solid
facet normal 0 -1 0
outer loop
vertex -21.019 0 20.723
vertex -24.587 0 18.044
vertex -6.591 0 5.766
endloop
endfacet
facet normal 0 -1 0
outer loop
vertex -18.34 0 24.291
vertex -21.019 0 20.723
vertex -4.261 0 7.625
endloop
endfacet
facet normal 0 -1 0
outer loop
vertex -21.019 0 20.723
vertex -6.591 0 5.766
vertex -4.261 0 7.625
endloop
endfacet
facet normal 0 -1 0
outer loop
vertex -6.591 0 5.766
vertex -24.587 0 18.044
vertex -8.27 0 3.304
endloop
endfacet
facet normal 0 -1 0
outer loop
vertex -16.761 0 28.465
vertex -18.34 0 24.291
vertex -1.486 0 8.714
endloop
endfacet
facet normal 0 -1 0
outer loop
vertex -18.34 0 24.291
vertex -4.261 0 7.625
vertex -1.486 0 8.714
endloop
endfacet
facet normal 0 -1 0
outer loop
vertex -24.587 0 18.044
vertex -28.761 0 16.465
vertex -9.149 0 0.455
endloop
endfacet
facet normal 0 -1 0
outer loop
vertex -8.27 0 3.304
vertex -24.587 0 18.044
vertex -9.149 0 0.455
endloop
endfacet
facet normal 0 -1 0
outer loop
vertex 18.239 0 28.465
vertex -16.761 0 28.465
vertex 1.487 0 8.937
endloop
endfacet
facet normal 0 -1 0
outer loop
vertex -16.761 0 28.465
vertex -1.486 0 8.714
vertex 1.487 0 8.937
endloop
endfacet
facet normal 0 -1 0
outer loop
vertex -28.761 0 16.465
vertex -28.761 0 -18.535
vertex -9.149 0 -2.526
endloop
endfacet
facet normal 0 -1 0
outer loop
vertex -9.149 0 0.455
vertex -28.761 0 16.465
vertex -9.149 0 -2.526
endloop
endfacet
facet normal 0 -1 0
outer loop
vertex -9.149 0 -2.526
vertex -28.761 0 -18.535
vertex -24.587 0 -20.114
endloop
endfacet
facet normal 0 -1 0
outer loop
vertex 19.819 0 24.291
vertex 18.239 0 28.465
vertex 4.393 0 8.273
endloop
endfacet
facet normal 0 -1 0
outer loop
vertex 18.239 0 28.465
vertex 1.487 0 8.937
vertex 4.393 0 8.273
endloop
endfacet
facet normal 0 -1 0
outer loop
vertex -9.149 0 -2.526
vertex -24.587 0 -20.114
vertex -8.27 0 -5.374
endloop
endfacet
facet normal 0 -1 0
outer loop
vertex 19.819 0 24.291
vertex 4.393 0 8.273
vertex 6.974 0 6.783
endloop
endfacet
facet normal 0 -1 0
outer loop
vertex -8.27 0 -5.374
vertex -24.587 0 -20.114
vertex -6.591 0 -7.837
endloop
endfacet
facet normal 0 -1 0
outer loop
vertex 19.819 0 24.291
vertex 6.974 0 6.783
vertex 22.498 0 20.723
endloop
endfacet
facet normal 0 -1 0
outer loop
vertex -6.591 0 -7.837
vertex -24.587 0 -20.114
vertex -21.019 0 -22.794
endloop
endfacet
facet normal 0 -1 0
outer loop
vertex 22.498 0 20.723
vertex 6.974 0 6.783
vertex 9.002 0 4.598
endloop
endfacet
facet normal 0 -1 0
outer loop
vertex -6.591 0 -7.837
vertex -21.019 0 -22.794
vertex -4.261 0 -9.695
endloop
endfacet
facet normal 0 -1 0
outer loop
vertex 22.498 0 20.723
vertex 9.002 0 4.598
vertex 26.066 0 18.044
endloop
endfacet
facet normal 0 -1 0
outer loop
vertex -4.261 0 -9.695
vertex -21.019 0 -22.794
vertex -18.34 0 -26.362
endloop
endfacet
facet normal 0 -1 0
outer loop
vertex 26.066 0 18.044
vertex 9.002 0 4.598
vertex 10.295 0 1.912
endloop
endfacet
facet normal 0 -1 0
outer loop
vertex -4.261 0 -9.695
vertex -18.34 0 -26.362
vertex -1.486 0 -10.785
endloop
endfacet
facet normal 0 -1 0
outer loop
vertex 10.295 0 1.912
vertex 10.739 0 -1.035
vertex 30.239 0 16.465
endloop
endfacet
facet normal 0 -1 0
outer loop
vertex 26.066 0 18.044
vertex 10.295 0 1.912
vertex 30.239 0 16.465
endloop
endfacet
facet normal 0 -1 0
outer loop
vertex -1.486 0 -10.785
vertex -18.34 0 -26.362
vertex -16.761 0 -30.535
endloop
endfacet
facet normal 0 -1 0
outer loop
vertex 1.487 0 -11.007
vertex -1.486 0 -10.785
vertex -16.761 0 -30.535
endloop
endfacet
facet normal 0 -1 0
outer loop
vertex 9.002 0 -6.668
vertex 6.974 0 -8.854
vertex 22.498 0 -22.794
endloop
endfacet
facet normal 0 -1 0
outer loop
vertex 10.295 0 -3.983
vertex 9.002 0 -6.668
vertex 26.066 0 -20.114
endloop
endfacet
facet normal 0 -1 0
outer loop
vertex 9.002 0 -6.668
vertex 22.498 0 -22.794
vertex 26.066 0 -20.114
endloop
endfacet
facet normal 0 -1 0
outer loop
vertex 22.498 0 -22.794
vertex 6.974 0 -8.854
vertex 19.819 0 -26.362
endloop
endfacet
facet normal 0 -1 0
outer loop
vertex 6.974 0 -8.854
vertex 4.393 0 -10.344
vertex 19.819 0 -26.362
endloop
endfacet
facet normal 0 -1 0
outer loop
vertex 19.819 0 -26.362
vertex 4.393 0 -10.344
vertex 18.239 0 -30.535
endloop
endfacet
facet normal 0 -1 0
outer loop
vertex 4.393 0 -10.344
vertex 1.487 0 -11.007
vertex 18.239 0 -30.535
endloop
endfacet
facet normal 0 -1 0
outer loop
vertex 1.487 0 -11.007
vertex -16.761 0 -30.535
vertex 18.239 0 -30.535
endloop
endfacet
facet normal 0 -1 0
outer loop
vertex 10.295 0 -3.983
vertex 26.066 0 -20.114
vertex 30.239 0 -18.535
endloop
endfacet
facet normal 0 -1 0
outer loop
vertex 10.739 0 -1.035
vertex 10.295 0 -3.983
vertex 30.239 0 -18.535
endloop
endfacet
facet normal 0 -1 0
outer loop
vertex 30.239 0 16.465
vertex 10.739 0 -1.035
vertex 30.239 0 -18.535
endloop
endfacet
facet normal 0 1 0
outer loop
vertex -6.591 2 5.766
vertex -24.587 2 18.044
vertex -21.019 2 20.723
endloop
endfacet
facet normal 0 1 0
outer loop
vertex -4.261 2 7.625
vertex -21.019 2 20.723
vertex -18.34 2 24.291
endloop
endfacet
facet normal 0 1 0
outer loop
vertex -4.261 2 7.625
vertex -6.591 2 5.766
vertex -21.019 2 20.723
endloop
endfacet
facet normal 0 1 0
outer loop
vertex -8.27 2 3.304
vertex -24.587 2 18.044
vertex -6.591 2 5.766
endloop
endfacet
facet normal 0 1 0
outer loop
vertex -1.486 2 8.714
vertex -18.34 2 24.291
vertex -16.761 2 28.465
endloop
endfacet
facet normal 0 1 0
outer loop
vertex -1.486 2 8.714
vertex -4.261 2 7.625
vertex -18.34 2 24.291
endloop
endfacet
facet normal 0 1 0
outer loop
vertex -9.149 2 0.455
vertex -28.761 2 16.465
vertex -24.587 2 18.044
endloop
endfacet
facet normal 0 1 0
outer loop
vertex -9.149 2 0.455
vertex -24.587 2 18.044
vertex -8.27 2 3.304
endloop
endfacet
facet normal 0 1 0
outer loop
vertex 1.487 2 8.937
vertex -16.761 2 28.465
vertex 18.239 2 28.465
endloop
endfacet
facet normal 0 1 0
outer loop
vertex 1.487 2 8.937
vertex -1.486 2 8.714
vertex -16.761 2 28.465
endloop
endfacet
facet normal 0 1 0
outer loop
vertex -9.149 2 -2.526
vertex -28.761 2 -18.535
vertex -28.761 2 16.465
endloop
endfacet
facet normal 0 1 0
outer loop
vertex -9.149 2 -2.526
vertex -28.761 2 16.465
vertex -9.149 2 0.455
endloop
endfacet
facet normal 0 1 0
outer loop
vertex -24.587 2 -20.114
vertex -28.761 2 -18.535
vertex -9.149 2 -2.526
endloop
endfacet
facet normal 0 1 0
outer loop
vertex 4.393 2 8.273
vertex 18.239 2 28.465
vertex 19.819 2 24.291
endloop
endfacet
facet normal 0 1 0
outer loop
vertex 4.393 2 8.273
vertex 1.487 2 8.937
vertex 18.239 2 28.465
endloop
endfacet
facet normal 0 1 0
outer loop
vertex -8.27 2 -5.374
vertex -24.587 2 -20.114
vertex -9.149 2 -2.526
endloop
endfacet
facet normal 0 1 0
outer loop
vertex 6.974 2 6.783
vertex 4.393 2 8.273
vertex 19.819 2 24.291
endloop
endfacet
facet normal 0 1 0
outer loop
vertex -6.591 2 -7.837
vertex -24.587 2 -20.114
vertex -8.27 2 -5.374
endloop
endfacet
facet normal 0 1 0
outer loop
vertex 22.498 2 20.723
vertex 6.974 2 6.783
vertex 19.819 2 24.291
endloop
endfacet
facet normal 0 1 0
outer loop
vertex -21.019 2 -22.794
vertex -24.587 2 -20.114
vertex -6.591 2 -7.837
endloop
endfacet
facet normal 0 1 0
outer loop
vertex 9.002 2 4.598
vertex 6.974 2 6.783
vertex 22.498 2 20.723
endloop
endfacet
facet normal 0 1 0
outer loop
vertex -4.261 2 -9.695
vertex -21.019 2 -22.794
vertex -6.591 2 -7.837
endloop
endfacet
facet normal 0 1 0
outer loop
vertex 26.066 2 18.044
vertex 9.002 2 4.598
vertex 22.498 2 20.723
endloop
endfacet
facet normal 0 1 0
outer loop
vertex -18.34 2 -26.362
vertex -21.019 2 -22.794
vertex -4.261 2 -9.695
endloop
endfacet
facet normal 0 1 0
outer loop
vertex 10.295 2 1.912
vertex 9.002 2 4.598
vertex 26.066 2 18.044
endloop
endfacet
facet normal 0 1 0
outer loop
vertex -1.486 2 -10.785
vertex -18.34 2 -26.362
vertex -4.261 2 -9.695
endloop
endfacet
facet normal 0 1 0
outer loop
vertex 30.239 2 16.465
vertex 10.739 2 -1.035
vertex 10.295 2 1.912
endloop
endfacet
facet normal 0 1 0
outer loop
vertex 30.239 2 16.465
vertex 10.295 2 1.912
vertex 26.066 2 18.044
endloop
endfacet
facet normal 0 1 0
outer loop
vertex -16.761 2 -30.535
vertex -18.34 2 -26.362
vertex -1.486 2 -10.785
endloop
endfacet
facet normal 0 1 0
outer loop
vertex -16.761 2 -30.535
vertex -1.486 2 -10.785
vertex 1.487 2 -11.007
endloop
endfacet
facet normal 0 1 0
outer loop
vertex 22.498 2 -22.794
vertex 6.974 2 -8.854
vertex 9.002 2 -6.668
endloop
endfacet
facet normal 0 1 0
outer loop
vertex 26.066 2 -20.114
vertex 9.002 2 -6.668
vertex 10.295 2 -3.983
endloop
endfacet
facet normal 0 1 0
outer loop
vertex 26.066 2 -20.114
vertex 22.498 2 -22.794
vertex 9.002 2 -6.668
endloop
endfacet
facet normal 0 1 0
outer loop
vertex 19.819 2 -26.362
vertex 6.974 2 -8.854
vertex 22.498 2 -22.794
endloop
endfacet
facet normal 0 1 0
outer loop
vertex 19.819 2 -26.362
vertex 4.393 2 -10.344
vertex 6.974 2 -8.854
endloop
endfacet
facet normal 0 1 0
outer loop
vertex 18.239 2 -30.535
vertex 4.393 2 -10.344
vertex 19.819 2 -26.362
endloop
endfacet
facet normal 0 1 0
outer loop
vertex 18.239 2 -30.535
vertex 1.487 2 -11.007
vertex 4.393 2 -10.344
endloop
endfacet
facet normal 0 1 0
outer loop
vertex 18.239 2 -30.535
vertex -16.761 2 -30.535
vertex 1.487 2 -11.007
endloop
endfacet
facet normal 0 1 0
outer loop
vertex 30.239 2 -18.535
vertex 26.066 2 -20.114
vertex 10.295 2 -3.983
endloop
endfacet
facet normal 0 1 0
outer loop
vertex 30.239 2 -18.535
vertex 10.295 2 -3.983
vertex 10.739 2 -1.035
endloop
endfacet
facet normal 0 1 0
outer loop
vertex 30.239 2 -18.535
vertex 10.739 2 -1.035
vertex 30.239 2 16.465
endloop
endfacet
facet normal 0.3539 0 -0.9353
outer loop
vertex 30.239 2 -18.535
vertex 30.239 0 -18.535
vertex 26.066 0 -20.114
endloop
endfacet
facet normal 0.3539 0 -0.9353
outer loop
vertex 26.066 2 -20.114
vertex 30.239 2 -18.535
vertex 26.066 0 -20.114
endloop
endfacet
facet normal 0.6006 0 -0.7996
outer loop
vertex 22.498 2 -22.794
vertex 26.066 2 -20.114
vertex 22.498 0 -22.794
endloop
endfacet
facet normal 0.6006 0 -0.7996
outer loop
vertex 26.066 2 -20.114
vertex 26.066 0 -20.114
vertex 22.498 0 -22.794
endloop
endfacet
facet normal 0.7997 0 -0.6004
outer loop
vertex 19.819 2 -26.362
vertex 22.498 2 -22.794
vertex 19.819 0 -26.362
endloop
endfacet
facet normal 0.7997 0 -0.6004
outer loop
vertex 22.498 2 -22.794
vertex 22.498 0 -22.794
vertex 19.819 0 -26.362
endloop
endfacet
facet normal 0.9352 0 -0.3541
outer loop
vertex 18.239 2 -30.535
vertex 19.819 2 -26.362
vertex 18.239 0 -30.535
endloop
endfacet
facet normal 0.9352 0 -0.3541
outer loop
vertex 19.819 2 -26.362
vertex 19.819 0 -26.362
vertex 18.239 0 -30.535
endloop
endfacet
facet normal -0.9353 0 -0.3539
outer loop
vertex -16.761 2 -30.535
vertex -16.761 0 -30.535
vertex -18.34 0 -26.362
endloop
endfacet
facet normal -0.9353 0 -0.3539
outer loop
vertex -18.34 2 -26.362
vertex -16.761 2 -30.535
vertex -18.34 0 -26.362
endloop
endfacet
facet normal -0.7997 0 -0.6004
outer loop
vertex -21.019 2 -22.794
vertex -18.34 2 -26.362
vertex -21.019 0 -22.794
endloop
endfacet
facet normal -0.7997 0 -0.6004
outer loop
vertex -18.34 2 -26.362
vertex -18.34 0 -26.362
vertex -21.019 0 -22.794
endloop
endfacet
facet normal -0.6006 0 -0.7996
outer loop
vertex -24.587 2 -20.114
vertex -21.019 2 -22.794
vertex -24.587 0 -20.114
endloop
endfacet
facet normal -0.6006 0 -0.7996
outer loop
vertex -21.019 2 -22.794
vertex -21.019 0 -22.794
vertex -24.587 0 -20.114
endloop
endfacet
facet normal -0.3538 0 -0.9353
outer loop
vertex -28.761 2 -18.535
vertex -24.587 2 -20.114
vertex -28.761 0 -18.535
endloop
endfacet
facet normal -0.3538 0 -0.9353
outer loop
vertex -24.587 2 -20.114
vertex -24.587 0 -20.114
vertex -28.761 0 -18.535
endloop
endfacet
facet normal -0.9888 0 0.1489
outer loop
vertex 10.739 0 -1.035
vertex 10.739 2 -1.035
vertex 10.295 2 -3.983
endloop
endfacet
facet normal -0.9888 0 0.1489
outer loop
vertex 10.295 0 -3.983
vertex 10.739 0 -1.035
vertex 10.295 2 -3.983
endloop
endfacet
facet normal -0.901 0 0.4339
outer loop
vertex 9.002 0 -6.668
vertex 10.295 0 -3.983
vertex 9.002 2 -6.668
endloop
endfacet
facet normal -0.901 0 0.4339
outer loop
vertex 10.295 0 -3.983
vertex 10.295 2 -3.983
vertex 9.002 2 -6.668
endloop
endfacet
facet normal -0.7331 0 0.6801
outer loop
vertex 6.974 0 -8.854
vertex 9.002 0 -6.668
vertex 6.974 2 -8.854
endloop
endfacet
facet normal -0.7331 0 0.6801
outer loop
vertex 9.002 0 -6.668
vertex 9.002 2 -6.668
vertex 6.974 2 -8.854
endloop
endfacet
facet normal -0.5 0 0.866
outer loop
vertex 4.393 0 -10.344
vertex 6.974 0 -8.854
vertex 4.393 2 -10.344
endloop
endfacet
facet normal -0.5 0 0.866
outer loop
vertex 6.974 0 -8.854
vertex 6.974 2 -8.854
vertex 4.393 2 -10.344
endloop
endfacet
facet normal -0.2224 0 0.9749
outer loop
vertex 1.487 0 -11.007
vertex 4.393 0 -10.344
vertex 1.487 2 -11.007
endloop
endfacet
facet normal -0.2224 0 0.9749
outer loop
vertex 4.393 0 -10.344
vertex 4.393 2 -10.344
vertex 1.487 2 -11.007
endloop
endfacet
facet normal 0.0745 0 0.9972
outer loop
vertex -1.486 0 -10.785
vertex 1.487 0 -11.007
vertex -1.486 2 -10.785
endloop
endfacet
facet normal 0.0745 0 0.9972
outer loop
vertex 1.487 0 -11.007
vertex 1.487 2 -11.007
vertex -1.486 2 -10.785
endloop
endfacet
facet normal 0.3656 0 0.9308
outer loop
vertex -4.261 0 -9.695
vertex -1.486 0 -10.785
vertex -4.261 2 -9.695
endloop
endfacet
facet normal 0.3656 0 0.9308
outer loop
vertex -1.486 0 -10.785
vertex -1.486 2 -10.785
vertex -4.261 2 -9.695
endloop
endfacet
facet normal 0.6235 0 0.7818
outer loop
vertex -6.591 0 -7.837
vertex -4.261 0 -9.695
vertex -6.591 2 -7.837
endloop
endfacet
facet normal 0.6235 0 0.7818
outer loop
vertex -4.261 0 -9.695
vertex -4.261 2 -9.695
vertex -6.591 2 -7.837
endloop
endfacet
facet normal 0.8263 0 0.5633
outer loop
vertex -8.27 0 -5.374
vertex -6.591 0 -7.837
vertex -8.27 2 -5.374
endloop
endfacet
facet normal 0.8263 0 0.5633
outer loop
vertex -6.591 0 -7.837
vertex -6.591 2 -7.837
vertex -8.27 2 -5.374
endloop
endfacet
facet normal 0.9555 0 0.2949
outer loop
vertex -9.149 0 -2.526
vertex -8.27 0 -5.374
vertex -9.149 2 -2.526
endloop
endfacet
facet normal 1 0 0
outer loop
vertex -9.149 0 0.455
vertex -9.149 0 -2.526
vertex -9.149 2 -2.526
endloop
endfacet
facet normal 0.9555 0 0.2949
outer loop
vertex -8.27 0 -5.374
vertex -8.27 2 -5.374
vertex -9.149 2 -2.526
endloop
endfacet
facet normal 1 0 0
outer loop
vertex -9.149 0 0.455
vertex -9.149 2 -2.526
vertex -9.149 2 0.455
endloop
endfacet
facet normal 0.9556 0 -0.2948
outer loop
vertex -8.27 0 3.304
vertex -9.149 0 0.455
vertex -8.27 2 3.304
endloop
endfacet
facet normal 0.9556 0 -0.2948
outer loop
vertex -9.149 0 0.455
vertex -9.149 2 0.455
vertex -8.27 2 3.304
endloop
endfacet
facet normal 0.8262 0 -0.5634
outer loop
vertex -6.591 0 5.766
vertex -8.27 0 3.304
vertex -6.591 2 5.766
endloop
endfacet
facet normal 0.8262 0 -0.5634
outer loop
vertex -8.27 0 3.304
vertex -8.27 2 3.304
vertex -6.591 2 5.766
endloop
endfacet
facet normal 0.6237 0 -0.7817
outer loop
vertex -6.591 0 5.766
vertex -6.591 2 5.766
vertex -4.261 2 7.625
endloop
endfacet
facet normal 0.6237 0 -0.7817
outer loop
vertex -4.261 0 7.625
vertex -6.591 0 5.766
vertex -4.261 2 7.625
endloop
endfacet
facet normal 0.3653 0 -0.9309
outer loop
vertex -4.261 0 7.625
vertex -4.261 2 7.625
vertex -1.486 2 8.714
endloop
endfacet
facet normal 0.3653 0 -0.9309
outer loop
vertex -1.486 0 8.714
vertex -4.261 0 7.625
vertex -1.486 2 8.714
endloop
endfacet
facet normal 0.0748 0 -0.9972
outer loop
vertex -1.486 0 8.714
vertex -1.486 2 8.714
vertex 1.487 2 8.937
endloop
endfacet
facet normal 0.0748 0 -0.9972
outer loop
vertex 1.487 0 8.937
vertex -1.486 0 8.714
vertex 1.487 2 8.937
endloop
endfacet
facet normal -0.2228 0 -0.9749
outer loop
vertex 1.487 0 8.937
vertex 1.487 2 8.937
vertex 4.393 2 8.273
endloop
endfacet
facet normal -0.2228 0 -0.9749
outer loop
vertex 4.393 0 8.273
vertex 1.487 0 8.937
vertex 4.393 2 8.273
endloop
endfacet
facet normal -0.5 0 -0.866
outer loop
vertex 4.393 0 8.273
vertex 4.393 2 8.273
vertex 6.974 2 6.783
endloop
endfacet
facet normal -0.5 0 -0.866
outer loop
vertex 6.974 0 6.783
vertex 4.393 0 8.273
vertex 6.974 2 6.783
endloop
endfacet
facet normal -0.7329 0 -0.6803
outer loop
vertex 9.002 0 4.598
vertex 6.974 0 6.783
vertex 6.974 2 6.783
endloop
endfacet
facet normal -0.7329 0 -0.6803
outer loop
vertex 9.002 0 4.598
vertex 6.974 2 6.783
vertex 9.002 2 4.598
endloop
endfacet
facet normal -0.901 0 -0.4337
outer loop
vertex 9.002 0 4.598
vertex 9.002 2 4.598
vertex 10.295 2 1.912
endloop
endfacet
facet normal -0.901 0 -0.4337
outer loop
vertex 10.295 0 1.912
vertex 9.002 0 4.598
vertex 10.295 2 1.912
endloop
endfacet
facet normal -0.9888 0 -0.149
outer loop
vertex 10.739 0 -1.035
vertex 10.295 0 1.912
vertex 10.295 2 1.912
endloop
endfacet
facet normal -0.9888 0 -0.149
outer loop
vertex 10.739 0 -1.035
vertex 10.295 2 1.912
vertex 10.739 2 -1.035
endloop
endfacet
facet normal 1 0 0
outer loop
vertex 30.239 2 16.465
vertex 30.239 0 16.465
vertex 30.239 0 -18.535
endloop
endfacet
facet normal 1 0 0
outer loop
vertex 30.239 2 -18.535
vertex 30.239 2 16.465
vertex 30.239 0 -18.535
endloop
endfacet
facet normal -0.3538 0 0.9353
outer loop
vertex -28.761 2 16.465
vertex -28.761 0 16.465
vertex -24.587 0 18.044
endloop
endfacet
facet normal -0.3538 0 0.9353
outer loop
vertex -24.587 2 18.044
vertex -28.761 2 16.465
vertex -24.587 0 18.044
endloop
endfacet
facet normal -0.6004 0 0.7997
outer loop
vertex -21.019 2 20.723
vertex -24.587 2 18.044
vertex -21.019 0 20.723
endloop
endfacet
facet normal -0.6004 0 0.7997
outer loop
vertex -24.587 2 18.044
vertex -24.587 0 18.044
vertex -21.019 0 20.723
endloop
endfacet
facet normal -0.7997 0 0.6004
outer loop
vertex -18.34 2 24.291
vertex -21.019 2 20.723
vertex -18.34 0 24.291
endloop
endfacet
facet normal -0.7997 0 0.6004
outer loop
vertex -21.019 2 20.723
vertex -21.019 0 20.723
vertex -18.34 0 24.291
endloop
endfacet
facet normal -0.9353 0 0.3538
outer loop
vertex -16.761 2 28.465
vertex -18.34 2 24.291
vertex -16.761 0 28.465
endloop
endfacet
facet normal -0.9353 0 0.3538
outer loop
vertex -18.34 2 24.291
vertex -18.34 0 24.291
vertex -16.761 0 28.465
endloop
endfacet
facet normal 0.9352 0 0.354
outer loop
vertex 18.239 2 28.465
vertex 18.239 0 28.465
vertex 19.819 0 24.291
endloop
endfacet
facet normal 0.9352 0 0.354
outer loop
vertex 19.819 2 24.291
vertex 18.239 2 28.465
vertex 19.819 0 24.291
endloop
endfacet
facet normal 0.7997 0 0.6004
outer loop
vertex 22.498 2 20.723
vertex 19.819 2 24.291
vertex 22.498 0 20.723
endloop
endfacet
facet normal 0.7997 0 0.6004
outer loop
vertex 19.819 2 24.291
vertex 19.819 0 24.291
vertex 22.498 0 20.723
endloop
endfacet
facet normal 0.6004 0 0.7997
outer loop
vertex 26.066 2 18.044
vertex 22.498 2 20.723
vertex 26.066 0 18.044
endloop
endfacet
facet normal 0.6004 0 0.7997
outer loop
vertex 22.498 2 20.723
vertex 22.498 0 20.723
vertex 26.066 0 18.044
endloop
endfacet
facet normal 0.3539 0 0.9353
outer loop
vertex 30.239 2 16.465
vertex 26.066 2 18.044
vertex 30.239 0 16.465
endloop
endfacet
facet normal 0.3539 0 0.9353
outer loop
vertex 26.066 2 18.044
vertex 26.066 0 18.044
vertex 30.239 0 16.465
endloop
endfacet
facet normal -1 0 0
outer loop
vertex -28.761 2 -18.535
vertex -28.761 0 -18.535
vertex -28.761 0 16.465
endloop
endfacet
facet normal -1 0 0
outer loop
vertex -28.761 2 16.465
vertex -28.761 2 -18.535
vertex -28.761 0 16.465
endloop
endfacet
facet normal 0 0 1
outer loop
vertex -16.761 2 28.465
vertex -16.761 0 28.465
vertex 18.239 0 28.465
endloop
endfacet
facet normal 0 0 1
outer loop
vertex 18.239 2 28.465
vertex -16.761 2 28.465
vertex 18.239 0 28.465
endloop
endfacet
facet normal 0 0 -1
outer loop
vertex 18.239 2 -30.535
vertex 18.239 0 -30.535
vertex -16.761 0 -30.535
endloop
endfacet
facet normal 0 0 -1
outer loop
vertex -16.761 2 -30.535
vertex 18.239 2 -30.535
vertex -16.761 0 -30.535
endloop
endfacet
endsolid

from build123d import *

# Parameters (mm, degrees)
BOSS_EXTRUDE1_DEPTH = 2
SKETCH6_R           = 10
CUT_EXTRUDE1_DEPTH  = 3


with BuildPart() as part:
    # Sketch1 → Boss-Extrude1 (new body)
    with BuildSketch(Plane(origin=(0, 0, 0), x_dir=(1, 0, 0), z_dir=(0, 1, 0))):
        with BuildLine():
            Line((-28.760538659, 18.535245878), (-28.760538659, -16.464754122))
            ThreePointArc((-28.760538659, -16.464754122), (-21.019242456, -20.723457919), (-16.760538659, -28.464754122))
            Line((-16.760538659, -28.464754122), (18.239461341, -28.464754122))
            ThreePointArc((18.239461341, -28.464754122), (22.498165139, -20.723457919), (30.239461341, -16.464754122))
            Line((30.239461341, -16.464754122), (30.239461341, 18.535245878))
            ThreePointArc((30.239461341, 18.535245878), (22.498165139, 22.793949675), (18.239461341, 30.535245878))
            Line((18.239461341, 30.535245878), (-16.760538659, 30.535245878))
            ThreePointArc((-16.760538659, 30.535245878), (-21.019242456, 22.793949675), (-28.760538659, 18.535245878))
        make_face()
    extrude(amount=BOSS_EXTRUDE1_DEPTH)

    # Sketch6 → Cut-Extrude1 (cut)
    with BuildSketch(Plane(origin=(0, 2, 0), x_dir=(1, 0, 0), z_dir=(0, 1, 0))):
        with Locations((0.739461341, 1.035245878)):
            Circle(SKETCH6_R)
    extrude(amount=-CUT_EXTRUDE1_DEPTH, mode=Mode.SUBTRACT)


solid = part.part
